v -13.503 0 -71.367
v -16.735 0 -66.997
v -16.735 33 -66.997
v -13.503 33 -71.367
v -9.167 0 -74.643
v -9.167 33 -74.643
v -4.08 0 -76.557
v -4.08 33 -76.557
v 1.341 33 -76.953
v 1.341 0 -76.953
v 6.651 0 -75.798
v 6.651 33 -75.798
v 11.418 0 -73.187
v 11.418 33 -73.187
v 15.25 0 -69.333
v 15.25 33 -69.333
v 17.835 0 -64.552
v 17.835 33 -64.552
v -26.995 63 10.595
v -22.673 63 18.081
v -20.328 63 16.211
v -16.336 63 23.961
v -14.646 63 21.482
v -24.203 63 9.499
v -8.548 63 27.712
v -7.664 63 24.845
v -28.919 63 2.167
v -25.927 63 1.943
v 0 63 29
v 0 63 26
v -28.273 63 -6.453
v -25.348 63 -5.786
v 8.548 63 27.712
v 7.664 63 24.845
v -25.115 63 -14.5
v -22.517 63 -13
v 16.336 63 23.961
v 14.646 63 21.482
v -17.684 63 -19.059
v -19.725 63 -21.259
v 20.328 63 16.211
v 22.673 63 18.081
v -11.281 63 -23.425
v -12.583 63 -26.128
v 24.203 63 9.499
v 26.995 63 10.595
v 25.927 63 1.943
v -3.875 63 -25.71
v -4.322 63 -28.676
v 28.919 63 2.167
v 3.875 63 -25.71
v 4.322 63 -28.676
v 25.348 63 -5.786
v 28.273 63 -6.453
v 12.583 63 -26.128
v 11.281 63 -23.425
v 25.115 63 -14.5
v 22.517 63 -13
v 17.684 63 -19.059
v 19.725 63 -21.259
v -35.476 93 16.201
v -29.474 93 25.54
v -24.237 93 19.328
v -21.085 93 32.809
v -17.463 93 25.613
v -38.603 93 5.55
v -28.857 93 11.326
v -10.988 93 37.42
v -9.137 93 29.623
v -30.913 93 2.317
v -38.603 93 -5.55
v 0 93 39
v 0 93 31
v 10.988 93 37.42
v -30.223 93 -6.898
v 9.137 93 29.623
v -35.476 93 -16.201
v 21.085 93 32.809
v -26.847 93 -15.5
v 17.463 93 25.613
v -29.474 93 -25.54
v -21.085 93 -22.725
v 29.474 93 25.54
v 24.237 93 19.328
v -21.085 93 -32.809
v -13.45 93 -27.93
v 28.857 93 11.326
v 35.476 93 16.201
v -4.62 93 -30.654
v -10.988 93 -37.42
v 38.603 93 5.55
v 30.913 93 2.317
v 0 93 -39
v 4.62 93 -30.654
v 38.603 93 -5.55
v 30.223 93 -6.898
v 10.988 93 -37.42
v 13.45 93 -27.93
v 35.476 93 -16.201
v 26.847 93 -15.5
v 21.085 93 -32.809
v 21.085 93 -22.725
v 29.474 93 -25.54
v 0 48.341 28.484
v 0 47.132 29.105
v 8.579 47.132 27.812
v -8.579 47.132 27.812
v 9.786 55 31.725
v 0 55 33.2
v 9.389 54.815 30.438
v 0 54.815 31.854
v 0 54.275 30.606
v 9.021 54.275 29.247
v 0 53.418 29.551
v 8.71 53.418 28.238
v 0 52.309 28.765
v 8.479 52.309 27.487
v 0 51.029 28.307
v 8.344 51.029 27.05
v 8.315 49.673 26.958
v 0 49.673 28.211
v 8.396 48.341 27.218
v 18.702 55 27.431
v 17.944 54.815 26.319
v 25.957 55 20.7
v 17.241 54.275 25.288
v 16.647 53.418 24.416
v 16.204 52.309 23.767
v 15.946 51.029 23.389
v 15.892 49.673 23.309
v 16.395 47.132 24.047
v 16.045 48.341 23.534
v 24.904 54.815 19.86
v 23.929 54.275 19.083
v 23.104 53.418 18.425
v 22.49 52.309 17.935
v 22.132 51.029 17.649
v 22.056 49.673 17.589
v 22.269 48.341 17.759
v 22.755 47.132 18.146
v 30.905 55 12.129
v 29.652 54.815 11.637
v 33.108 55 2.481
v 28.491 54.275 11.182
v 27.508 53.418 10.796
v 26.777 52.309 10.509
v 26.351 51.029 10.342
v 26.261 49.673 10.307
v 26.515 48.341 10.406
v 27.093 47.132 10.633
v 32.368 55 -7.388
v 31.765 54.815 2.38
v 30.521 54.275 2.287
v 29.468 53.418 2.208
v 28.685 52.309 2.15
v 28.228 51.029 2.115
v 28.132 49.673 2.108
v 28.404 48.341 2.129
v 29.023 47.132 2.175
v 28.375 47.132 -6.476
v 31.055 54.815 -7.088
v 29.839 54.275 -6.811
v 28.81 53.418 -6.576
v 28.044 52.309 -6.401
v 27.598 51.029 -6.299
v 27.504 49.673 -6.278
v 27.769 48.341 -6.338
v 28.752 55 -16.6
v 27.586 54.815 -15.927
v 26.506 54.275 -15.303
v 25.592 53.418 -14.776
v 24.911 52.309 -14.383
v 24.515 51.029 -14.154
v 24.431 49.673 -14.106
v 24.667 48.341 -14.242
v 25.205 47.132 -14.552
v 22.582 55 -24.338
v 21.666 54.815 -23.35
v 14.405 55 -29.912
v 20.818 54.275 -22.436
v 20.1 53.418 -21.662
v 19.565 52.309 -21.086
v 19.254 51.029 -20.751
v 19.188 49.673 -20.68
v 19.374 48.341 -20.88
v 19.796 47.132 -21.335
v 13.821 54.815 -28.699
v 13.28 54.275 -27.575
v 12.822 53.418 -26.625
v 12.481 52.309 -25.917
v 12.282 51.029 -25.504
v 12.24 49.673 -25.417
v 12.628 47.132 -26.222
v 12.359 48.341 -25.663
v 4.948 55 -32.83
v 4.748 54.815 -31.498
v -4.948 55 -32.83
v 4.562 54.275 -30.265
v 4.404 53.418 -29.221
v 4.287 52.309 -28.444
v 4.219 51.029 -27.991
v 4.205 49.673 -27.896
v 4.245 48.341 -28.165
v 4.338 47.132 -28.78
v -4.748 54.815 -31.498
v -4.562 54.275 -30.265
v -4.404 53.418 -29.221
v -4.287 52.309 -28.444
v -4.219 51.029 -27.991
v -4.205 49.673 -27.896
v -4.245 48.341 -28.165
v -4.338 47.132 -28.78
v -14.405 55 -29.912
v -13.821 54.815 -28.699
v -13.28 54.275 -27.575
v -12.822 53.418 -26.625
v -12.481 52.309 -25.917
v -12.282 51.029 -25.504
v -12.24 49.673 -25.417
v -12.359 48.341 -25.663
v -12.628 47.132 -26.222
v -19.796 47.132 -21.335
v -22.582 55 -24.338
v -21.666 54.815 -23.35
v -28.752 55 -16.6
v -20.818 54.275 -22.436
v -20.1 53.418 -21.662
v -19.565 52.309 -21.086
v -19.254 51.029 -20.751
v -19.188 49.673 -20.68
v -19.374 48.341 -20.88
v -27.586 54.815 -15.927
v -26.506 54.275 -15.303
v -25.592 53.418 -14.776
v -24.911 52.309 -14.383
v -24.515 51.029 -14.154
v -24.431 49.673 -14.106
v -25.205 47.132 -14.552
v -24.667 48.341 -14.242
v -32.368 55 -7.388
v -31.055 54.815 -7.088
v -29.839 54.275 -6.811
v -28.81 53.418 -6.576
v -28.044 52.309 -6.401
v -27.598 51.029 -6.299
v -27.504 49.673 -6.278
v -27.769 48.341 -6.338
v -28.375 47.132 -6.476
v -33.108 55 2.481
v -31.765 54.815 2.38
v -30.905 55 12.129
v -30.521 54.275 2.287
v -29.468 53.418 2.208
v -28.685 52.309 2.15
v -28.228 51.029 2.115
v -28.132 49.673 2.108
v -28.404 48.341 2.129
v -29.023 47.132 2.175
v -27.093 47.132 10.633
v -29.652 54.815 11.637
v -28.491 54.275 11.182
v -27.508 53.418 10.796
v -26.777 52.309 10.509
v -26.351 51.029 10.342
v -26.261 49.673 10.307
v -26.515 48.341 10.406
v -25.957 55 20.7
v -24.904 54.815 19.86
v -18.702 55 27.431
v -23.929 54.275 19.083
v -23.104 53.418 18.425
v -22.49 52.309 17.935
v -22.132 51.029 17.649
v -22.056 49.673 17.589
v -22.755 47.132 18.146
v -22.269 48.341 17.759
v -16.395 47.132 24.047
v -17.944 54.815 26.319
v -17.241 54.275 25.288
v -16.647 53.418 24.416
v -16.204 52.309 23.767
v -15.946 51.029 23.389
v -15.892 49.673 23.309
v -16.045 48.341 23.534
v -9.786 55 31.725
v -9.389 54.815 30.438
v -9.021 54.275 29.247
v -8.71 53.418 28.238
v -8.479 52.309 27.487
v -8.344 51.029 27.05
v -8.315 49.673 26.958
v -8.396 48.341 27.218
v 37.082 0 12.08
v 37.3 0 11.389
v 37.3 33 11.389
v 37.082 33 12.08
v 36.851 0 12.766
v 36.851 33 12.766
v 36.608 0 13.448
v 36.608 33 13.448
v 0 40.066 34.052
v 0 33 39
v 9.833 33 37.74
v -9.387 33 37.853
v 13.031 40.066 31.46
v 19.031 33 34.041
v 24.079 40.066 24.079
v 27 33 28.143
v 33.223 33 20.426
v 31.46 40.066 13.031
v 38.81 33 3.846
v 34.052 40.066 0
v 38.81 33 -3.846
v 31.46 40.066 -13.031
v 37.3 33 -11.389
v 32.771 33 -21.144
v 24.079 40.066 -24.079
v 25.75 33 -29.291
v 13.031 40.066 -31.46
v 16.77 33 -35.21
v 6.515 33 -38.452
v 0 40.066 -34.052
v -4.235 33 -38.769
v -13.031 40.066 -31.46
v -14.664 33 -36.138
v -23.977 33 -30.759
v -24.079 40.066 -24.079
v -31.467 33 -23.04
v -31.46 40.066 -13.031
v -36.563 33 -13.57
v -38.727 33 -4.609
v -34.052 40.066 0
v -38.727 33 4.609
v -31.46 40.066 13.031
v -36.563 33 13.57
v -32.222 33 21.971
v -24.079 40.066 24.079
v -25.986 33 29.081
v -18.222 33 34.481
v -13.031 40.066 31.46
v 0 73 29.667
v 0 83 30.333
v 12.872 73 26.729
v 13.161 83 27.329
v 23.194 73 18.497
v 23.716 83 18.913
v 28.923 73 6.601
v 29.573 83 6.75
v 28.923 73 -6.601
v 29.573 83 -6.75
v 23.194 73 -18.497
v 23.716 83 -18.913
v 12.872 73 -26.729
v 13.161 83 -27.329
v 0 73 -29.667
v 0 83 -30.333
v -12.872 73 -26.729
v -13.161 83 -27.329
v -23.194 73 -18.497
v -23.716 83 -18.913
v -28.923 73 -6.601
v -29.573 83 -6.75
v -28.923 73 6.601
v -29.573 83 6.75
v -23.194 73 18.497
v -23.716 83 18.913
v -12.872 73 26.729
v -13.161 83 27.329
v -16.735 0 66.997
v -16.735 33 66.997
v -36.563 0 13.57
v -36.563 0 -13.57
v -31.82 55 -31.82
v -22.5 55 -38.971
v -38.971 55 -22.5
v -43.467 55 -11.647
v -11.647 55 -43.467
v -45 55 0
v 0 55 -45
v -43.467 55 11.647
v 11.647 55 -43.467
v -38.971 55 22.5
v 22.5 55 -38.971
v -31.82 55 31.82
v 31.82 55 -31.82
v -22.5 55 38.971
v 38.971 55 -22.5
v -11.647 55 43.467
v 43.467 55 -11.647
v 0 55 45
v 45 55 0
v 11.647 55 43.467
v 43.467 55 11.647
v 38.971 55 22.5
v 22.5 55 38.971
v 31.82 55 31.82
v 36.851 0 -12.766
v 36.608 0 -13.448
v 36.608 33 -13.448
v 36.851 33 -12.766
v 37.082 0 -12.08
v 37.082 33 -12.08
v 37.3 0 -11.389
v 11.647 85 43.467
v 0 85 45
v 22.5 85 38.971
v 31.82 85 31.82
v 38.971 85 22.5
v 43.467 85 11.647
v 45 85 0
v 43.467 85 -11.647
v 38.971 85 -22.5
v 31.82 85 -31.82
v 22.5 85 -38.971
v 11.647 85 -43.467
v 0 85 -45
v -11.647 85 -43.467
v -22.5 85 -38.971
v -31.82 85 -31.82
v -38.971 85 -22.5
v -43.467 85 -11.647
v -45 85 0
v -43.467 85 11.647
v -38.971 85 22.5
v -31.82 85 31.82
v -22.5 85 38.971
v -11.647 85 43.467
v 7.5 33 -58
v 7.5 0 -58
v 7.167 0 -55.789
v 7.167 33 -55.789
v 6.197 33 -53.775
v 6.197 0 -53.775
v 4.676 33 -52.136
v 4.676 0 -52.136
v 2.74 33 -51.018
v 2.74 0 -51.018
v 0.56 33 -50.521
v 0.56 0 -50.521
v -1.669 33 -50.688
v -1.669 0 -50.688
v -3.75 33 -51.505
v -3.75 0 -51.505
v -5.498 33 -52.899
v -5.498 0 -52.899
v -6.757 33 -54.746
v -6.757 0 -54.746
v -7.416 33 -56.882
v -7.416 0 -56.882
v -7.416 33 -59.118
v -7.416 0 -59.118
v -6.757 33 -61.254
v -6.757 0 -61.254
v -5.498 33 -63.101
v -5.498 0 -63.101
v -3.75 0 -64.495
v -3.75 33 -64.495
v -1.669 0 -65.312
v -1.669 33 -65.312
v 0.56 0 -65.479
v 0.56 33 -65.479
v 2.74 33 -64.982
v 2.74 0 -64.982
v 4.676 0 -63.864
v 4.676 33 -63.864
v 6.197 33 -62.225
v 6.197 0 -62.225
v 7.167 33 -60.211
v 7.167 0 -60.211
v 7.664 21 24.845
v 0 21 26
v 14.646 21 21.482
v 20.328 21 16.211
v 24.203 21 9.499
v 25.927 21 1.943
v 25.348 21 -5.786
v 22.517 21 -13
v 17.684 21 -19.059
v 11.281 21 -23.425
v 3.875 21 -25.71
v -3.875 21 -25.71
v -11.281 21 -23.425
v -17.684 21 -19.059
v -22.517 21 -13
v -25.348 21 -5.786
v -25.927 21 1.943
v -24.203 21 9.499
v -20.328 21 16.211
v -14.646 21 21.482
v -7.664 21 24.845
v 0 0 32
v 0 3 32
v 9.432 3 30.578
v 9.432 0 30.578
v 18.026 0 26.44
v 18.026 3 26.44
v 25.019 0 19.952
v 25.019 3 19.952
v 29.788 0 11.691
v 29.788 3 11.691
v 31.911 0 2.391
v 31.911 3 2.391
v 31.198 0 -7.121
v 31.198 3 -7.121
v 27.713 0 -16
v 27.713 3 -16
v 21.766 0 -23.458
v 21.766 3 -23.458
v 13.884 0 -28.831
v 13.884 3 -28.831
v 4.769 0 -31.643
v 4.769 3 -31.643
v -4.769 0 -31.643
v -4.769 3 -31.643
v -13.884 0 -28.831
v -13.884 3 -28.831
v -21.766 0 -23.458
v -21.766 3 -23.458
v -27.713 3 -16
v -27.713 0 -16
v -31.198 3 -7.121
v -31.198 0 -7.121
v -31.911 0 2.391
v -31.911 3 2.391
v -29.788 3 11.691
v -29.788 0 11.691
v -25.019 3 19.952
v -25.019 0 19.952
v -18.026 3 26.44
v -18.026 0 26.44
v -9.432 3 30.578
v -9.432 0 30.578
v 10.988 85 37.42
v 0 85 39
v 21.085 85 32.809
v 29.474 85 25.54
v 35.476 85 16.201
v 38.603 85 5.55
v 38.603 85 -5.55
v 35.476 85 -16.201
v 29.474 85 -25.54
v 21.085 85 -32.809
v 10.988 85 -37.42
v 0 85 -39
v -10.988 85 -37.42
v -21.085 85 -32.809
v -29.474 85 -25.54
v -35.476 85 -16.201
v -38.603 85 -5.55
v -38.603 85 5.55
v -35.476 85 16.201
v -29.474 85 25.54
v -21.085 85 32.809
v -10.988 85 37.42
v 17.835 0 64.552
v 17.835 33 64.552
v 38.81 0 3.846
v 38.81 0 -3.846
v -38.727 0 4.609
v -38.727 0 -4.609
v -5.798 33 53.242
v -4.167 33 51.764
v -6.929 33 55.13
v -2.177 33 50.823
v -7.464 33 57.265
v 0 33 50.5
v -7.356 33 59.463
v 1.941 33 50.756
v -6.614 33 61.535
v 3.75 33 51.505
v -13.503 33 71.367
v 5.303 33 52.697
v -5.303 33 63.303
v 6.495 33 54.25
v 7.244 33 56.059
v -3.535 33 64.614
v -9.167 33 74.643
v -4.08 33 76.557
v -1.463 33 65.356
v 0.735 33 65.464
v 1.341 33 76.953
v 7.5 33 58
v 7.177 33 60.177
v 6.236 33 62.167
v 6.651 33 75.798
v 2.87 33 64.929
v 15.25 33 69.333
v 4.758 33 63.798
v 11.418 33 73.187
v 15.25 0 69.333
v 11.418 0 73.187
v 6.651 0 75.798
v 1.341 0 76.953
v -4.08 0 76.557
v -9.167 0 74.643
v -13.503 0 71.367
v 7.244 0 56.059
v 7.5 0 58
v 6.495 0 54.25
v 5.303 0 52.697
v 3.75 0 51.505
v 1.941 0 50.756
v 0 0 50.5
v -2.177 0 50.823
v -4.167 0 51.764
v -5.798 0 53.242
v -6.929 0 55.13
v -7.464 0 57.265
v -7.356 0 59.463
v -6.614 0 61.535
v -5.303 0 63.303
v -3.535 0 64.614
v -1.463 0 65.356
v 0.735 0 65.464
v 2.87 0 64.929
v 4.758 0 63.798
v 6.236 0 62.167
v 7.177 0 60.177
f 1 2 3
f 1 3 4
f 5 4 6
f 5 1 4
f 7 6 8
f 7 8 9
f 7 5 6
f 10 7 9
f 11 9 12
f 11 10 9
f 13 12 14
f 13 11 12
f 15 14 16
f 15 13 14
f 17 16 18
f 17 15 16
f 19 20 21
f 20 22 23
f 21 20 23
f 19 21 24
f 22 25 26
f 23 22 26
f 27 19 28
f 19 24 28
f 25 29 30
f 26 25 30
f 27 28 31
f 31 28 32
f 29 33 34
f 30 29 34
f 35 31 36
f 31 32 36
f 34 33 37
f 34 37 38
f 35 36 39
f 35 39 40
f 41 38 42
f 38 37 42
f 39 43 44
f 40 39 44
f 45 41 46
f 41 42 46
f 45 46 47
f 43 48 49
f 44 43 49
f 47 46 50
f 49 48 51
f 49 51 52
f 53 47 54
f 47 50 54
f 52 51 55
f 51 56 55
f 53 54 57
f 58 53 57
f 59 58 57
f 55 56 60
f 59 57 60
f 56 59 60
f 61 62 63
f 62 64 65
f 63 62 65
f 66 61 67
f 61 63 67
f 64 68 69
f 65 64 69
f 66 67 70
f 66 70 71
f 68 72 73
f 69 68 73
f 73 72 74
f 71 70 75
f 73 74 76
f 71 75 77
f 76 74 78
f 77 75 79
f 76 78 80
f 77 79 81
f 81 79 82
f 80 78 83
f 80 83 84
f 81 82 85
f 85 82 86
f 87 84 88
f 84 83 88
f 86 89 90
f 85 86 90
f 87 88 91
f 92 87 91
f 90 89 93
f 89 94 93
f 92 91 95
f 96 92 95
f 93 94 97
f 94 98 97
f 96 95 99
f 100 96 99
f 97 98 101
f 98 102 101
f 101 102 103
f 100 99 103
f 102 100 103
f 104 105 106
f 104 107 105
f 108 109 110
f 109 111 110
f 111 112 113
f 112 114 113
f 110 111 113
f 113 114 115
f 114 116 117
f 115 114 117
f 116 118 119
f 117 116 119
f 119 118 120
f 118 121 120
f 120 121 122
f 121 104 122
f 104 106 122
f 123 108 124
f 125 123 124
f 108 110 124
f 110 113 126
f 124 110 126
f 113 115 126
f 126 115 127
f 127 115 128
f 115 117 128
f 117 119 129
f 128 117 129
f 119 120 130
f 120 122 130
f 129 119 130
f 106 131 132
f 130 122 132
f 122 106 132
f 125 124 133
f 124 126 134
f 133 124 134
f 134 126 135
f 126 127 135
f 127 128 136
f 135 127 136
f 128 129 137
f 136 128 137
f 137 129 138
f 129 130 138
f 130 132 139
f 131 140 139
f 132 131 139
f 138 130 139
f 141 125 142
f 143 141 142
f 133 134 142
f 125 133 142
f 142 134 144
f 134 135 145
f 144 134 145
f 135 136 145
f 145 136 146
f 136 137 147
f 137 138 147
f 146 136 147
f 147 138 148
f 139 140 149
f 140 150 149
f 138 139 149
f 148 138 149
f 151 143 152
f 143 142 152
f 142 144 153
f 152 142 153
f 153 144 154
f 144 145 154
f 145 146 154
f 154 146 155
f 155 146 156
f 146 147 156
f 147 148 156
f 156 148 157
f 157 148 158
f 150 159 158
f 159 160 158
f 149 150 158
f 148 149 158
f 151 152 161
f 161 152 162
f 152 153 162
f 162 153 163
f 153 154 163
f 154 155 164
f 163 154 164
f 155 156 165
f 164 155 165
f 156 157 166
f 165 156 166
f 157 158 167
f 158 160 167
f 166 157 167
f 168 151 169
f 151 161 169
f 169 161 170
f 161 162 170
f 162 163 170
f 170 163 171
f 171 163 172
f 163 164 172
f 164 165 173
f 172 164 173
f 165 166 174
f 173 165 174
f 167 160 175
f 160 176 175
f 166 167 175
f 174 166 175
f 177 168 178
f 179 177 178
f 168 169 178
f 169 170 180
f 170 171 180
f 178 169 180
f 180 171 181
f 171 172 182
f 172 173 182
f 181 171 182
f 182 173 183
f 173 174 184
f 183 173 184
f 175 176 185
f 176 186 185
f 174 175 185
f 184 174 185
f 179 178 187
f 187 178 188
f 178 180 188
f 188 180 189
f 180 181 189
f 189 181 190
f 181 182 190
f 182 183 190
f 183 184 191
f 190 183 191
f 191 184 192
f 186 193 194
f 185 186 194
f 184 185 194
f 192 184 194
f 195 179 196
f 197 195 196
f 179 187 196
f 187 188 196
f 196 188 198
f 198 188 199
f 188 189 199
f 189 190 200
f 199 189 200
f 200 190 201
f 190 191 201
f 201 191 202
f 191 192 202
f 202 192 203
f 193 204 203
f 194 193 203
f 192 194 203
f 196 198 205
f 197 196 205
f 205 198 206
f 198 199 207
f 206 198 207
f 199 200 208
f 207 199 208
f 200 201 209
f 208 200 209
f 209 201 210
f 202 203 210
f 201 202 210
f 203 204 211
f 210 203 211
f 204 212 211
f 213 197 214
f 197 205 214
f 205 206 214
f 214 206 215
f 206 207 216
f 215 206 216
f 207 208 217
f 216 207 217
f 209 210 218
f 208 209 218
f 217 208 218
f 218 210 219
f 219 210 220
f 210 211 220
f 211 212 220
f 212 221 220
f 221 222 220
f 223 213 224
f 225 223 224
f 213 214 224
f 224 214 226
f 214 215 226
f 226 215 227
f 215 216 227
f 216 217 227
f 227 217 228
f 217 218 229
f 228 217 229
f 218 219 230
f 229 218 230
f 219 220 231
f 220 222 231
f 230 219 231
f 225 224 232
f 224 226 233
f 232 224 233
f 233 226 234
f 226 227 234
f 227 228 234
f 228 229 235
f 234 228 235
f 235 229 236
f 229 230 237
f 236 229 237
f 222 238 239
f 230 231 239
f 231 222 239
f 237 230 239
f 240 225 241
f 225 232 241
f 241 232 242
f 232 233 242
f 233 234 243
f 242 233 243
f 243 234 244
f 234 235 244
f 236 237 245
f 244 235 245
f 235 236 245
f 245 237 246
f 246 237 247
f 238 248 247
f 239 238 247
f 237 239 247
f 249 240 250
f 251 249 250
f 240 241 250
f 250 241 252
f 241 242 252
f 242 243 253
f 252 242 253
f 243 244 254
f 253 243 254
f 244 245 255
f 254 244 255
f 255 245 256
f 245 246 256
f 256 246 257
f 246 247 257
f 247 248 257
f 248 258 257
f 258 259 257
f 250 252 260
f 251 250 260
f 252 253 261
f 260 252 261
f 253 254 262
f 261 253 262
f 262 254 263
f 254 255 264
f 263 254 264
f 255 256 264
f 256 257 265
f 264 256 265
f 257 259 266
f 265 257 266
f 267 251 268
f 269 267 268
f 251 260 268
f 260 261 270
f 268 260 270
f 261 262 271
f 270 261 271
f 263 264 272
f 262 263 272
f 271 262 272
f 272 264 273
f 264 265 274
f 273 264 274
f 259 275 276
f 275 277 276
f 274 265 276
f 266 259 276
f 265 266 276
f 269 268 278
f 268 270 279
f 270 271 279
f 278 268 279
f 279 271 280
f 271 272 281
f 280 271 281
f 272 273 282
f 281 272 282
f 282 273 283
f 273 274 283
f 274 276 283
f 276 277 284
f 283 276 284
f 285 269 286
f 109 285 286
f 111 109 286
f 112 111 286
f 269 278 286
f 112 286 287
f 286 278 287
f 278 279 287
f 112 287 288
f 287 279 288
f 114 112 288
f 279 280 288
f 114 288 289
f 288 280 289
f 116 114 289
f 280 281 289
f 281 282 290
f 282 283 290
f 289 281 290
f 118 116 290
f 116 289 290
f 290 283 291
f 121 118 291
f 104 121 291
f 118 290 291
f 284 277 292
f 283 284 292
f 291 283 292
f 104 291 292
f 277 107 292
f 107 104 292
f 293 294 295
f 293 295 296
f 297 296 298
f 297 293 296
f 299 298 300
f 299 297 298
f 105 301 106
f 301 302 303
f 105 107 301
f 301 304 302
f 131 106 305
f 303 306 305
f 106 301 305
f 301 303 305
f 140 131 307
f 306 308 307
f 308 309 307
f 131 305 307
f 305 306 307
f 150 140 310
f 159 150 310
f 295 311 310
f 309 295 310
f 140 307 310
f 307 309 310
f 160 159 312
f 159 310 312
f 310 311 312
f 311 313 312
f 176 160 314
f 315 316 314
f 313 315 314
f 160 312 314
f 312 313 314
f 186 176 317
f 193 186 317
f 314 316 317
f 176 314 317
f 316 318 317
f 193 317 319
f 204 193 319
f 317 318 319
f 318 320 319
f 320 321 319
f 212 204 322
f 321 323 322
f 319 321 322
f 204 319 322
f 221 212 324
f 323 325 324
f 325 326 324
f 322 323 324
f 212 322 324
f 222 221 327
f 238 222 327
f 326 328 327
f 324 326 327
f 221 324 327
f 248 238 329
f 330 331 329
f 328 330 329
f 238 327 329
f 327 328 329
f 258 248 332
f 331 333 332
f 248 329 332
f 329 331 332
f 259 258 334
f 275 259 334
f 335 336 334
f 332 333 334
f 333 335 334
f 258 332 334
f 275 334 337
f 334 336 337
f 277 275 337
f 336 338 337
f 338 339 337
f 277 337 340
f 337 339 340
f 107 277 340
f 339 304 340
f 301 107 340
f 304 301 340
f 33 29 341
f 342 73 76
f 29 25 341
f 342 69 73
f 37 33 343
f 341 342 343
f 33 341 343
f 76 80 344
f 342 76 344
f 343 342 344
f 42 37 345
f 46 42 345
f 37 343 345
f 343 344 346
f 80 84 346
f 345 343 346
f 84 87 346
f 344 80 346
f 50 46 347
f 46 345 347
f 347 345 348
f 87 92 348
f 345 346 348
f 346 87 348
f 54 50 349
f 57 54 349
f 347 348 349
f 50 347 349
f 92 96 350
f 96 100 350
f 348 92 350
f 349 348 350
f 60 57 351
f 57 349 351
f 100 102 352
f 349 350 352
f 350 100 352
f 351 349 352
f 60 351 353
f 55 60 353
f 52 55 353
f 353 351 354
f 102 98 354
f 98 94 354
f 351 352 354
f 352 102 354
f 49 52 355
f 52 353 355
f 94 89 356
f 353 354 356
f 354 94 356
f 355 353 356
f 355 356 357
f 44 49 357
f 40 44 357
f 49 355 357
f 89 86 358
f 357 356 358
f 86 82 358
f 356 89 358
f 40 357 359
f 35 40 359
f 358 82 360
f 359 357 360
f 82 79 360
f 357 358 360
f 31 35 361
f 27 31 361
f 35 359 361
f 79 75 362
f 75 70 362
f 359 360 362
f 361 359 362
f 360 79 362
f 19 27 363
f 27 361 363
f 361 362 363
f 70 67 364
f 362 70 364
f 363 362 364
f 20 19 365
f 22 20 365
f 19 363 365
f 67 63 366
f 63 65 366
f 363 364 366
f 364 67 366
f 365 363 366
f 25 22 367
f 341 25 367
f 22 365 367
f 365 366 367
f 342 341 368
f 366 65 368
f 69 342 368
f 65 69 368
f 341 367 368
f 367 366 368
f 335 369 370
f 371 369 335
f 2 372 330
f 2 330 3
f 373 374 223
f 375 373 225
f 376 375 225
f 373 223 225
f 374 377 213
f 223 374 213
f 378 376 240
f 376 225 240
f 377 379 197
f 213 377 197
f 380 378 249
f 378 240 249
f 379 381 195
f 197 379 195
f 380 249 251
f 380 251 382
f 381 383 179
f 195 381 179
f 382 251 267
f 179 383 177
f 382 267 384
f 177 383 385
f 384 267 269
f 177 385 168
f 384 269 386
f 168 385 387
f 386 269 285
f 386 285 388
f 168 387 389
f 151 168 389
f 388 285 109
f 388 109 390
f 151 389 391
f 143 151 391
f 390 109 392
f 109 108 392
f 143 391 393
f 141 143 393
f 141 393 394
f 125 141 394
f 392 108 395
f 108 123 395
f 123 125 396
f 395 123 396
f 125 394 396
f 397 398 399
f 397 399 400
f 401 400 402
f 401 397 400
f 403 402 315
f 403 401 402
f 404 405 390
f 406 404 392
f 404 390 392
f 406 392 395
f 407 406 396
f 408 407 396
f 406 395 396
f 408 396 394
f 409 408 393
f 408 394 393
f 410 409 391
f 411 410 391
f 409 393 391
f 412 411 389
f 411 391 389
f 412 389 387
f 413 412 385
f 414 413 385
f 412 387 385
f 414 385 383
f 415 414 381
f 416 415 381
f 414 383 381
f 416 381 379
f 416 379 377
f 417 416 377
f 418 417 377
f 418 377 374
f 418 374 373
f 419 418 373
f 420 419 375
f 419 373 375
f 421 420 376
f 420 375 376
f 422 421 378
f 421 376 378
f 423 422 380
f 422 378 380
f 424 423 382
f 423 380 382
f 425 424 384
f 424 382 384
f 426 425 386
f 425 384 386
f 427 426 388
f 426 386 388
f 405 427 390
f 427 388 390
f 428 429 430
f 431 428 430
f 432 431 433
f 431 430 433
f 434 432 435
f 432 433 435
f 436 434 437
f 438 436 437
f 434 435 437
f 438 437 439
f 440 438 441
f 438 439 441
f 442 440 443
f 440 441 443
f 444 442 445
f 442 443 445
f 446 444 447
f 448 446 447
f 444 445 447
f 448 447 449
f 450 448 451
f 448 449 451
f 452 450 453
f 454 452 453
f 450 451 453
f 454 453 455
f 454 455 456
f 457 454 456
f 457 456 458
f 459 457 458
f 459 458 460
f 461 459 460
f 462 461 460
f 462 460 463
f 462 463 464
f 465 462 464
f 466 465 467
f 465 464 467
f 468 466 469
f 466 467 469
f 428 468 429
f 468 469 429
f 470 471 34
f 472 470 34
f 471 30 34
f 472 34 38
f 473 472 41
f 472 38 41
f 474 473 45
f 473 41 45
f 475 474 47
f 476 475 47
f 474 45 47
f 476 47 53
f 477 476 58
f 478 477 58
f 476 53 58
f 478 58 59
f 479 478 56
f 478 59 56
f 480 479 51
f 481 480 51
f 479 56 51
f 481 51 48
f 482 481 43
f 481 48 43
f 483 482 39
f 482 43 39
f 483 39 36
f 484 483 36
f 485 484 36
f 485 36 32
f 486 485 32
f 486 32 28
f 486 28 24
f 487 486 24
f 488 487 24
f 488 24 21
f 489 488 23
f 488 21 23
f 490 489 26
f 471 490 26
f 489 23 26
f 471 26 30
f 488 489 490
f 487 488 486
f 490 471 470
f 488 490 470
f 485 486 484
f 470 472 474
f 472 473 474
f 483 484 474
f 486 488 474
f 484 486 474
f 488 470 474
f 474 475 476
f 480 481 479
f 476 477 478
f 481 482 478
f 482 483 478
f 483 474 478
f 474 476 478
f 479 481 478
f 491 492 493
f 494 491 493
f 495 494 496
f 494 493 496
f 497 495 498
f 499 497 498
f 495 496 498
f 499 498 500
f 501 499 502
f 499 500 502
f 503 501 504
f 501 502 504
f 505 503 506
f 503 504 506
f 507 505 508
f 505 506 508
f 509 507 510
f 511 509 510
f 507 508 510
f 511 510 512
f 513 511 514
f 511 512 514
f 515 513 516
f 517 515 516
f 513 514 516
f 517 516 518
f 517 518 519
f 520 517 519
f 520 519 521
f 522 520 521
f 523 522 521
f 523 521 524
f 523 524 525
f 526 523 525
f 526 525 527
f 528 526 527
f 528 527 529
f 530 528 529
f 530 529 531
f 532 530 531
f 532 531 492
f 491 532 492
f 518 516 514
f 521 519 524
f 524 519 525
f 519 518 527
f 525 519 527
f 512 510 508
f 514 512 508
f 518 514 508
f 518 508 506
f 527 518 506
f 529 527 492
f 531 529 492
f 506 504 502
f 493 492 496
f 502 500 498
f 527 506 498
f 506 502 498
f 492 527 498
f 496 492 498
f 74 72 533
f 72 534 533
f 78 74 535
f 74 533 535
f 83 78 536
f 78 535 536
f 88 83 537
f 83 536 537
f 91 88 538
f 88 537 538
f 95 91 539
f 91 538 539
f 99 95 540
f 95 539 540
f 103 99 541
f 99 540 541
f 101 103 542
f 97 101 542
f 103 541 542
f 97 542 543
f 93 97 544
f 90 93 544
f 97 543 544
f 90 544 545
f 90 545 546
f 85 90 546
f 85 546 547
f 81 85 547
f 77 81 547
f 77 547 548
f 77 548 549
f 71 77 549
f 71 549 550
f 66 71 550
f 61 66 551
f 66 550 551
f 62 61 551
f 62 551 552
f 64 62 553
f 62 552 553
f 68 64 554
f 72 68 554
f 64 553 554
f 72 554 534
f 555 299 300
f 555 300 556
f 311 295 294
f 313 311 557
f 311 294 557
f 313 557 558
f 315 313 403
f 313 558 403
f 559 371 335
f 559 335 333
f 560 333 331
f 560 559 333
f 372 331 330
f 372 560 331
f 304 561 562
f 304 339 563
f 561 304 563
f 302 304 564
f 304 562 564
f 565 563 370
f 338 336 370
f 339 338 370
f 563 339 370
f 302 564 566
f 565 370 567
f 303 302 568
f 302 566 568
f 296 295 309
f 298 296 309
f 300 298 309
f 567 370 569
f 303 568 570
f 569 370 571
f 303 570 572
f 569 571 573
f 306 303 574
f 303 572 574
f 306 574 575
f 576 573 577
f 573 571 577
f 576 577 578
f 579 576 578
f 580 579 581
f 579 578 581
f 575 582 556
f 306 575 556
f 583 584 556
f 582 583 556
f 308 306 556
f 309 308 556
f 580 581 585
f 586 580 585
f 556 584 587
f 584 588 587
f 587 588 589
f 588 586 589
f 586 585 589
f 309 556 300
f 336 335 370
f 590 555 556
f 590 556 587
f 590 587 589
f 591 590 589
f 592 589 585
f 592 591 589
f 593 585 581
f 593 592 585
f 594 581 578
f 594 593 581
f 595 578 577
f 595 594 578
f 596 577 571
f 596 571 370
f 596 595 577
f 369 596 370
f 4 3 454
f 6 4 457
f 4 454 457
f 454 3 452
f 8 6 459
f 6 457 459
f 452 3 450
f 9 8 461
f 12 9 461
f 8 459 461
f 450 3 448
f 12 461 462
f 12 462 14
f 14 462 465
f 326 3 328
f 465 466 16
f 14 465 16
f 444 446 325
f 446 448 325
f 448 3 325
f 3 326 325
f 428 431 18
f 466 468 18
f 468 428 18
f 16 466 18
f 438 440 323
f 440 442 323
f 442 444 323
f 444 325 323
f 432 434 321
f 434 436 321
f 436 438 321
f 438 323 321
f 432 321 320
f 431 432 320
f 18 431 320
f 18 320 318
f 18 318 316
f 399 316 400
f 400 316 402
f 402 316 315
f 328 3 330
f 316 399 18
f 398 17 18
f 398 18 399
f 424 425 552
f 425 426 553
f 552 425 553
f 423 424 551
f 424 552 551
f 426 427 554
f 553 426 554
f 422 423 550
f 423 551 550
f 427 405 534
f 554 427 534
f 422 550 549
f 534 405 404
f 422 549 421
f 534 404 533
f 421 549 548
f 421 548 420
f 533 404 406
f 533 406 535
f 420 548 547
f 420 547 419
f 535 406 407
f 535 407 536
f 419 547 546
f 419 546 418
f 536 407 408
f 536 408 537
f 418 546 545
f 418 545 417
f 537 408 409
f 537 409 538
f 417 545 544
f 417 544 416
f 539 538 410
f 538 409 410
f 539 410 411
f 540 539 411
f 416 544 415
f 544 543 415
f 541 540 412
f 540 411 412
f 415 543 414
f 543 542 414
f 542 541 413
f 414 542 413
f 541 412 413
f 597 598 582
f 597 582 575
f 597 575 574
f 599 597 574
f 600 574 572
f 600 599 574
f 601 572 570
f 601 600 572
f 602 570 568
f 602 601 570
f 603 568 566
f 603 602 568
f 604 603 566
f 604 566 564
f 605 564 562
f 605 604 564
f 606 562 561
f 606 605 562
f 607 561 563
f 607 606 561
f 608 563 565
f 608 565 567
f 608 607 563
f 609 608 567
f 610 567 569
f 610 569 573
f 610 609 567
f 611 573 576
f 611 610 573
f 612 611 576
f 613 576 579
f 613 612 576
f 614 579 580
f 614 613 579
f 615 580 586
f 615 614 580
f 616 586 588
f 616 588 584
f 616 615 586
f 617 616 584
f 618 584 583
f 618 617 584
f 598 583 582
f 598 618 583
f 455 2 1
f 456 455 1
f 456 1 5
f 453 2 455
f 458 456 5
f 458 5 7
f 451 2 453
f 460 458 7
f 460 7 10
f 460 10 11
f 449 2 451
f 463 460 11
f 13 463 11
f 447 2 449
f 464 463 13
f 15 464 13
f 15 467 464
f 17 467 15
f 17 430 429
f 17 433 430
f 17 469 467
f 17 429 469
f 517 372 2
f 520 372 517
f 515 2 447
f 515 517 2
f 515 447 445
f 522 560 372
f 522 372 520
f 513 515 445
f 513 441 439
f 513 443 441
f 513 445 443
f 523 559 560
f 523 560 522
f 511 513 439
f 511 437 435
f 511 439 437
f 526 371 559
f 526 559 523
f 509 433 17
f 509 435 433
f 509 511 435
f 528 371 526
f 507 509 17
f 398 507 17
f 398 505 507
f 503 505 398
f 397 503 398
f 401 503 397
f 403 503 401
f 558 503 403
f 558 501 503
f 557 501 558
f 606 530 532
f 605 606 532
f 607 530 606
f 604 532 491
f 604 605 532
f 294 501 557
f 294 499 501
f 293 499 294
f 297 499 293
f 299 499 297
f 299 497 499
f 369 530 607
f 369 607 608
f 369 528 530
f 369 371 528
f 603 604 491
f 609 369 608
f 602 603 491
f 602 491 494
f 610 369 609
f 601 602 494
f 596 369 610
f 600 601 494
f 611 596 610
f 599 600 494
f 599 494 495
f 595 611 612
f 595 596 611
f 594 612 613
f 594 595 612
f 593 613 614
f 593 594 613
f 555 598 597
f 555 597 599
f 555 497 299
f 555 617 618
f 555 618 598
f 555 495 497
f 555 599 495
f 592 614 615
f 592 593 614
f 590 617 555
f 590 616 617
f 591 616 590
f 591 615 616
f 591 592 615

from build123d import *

# Parameters (mm, degrees)
F2_R     = 7.5
F2_R_2   = 32
F3_DEPTH = 33


with BuildPart() as f1:
    # F0 (on Right) → F1 (revolve)
    with BuildSketch(Plane.YZ):
        with BuildLine():
            Line((3, 32), (3, 0))
            Line((3, 0), (21, 0))
            Line((21, 0), (21, 26))
            Line((21, 26), (63, 26))
            Line((63, 26), (63, 29))
            Line((63, 29), (93, 31))
            Line((93, 31), (93, 39))
            Line((93, 39), (85, 39))
            Line((85, 39), (85, 45))
            Line((85, 45), (55, 45))
            Line((55, 45), (55, 33.200345))
            ThreePointArc((55, 33.200345), (52.308743, 28.765291), (47.132118, 29.104585))
            Line((47.132118, 29.104585), (33, 39))
            Line((33, 39), (0, 39))
            Line((0, 39), (0, 32))
            Line((0, 32), (3, 32))
        make_face()
    revolve(axis=Axis((0, 12, 0), (0, 1, 0)))

    # F2 (on face) → F3 (join)
    with BuildSketch(Plane.XZ):
        with BuildLine():
            Line((36.607976, 13.448276), (17.834655, 64.551724))
            ThreePointArc((17.834655, 64.551724), (1.340517, 76.952652), (-16.734909, 66.996823))
            Line((-16.734909, 66.996823), (-36.563187, 13.569575))
            ThreePointArc((-36.563187, 13.569575), (0.064652, 38.999946), (36.607976, 13.448276))
        make_face()
        with BuildLine():
            ThreePointArc((0, 50.5), (-5.303301, 63.303301), (7.5, 58))
            ThreePointArc((7.5, 58), (5.303301, 52.696699), (0, 50.5))
        make_face(mode=Mode.SUBTRACT)
        with BuildLine():
            ThreePointArc((36.607976, -13.448276), (0.064652, -38.999946), (-36.563187, -13.569575))
            Line((-36.563187, -13.569575), (-16.734909, -66.996823))
            ThreePointArc((-16.734909, -66.996823), (1.340517, -76.952652), (17.834655, -64.551724))
            Line((17.834655, -64.551724), (36.607976, -13.448276))
        make_face()
        with Locations((0, -58)):
            Circle(F2_R, mode=Mode.SUBTRACT)
        with BuildLine():
            ThreePointArc((39, 0), (38.397337, 6.829676), (36.607976, 13.448276))
            ThreePointArc((36.607976, 13.448276), (0.064652, 38.999946), (-36.563187, 13.569575))
            ThreePointArc((-36.563187, 13.569575), (-39, 0), (-36.563187, -13.569575))
            ThreePointArc((-36.563187, -13.569575), (0.064652, -38.999946), (36.607976, -13.448276))
            ThreePointArc((36.607976, -13.448276), (38.397337, -6.829676), (39, 0))
        make_face()
        Circle(F2_R_2, mode=Mode.SUBTRACT)
    extrude(amount=-F3_DEPTH)


solid = f1.part
